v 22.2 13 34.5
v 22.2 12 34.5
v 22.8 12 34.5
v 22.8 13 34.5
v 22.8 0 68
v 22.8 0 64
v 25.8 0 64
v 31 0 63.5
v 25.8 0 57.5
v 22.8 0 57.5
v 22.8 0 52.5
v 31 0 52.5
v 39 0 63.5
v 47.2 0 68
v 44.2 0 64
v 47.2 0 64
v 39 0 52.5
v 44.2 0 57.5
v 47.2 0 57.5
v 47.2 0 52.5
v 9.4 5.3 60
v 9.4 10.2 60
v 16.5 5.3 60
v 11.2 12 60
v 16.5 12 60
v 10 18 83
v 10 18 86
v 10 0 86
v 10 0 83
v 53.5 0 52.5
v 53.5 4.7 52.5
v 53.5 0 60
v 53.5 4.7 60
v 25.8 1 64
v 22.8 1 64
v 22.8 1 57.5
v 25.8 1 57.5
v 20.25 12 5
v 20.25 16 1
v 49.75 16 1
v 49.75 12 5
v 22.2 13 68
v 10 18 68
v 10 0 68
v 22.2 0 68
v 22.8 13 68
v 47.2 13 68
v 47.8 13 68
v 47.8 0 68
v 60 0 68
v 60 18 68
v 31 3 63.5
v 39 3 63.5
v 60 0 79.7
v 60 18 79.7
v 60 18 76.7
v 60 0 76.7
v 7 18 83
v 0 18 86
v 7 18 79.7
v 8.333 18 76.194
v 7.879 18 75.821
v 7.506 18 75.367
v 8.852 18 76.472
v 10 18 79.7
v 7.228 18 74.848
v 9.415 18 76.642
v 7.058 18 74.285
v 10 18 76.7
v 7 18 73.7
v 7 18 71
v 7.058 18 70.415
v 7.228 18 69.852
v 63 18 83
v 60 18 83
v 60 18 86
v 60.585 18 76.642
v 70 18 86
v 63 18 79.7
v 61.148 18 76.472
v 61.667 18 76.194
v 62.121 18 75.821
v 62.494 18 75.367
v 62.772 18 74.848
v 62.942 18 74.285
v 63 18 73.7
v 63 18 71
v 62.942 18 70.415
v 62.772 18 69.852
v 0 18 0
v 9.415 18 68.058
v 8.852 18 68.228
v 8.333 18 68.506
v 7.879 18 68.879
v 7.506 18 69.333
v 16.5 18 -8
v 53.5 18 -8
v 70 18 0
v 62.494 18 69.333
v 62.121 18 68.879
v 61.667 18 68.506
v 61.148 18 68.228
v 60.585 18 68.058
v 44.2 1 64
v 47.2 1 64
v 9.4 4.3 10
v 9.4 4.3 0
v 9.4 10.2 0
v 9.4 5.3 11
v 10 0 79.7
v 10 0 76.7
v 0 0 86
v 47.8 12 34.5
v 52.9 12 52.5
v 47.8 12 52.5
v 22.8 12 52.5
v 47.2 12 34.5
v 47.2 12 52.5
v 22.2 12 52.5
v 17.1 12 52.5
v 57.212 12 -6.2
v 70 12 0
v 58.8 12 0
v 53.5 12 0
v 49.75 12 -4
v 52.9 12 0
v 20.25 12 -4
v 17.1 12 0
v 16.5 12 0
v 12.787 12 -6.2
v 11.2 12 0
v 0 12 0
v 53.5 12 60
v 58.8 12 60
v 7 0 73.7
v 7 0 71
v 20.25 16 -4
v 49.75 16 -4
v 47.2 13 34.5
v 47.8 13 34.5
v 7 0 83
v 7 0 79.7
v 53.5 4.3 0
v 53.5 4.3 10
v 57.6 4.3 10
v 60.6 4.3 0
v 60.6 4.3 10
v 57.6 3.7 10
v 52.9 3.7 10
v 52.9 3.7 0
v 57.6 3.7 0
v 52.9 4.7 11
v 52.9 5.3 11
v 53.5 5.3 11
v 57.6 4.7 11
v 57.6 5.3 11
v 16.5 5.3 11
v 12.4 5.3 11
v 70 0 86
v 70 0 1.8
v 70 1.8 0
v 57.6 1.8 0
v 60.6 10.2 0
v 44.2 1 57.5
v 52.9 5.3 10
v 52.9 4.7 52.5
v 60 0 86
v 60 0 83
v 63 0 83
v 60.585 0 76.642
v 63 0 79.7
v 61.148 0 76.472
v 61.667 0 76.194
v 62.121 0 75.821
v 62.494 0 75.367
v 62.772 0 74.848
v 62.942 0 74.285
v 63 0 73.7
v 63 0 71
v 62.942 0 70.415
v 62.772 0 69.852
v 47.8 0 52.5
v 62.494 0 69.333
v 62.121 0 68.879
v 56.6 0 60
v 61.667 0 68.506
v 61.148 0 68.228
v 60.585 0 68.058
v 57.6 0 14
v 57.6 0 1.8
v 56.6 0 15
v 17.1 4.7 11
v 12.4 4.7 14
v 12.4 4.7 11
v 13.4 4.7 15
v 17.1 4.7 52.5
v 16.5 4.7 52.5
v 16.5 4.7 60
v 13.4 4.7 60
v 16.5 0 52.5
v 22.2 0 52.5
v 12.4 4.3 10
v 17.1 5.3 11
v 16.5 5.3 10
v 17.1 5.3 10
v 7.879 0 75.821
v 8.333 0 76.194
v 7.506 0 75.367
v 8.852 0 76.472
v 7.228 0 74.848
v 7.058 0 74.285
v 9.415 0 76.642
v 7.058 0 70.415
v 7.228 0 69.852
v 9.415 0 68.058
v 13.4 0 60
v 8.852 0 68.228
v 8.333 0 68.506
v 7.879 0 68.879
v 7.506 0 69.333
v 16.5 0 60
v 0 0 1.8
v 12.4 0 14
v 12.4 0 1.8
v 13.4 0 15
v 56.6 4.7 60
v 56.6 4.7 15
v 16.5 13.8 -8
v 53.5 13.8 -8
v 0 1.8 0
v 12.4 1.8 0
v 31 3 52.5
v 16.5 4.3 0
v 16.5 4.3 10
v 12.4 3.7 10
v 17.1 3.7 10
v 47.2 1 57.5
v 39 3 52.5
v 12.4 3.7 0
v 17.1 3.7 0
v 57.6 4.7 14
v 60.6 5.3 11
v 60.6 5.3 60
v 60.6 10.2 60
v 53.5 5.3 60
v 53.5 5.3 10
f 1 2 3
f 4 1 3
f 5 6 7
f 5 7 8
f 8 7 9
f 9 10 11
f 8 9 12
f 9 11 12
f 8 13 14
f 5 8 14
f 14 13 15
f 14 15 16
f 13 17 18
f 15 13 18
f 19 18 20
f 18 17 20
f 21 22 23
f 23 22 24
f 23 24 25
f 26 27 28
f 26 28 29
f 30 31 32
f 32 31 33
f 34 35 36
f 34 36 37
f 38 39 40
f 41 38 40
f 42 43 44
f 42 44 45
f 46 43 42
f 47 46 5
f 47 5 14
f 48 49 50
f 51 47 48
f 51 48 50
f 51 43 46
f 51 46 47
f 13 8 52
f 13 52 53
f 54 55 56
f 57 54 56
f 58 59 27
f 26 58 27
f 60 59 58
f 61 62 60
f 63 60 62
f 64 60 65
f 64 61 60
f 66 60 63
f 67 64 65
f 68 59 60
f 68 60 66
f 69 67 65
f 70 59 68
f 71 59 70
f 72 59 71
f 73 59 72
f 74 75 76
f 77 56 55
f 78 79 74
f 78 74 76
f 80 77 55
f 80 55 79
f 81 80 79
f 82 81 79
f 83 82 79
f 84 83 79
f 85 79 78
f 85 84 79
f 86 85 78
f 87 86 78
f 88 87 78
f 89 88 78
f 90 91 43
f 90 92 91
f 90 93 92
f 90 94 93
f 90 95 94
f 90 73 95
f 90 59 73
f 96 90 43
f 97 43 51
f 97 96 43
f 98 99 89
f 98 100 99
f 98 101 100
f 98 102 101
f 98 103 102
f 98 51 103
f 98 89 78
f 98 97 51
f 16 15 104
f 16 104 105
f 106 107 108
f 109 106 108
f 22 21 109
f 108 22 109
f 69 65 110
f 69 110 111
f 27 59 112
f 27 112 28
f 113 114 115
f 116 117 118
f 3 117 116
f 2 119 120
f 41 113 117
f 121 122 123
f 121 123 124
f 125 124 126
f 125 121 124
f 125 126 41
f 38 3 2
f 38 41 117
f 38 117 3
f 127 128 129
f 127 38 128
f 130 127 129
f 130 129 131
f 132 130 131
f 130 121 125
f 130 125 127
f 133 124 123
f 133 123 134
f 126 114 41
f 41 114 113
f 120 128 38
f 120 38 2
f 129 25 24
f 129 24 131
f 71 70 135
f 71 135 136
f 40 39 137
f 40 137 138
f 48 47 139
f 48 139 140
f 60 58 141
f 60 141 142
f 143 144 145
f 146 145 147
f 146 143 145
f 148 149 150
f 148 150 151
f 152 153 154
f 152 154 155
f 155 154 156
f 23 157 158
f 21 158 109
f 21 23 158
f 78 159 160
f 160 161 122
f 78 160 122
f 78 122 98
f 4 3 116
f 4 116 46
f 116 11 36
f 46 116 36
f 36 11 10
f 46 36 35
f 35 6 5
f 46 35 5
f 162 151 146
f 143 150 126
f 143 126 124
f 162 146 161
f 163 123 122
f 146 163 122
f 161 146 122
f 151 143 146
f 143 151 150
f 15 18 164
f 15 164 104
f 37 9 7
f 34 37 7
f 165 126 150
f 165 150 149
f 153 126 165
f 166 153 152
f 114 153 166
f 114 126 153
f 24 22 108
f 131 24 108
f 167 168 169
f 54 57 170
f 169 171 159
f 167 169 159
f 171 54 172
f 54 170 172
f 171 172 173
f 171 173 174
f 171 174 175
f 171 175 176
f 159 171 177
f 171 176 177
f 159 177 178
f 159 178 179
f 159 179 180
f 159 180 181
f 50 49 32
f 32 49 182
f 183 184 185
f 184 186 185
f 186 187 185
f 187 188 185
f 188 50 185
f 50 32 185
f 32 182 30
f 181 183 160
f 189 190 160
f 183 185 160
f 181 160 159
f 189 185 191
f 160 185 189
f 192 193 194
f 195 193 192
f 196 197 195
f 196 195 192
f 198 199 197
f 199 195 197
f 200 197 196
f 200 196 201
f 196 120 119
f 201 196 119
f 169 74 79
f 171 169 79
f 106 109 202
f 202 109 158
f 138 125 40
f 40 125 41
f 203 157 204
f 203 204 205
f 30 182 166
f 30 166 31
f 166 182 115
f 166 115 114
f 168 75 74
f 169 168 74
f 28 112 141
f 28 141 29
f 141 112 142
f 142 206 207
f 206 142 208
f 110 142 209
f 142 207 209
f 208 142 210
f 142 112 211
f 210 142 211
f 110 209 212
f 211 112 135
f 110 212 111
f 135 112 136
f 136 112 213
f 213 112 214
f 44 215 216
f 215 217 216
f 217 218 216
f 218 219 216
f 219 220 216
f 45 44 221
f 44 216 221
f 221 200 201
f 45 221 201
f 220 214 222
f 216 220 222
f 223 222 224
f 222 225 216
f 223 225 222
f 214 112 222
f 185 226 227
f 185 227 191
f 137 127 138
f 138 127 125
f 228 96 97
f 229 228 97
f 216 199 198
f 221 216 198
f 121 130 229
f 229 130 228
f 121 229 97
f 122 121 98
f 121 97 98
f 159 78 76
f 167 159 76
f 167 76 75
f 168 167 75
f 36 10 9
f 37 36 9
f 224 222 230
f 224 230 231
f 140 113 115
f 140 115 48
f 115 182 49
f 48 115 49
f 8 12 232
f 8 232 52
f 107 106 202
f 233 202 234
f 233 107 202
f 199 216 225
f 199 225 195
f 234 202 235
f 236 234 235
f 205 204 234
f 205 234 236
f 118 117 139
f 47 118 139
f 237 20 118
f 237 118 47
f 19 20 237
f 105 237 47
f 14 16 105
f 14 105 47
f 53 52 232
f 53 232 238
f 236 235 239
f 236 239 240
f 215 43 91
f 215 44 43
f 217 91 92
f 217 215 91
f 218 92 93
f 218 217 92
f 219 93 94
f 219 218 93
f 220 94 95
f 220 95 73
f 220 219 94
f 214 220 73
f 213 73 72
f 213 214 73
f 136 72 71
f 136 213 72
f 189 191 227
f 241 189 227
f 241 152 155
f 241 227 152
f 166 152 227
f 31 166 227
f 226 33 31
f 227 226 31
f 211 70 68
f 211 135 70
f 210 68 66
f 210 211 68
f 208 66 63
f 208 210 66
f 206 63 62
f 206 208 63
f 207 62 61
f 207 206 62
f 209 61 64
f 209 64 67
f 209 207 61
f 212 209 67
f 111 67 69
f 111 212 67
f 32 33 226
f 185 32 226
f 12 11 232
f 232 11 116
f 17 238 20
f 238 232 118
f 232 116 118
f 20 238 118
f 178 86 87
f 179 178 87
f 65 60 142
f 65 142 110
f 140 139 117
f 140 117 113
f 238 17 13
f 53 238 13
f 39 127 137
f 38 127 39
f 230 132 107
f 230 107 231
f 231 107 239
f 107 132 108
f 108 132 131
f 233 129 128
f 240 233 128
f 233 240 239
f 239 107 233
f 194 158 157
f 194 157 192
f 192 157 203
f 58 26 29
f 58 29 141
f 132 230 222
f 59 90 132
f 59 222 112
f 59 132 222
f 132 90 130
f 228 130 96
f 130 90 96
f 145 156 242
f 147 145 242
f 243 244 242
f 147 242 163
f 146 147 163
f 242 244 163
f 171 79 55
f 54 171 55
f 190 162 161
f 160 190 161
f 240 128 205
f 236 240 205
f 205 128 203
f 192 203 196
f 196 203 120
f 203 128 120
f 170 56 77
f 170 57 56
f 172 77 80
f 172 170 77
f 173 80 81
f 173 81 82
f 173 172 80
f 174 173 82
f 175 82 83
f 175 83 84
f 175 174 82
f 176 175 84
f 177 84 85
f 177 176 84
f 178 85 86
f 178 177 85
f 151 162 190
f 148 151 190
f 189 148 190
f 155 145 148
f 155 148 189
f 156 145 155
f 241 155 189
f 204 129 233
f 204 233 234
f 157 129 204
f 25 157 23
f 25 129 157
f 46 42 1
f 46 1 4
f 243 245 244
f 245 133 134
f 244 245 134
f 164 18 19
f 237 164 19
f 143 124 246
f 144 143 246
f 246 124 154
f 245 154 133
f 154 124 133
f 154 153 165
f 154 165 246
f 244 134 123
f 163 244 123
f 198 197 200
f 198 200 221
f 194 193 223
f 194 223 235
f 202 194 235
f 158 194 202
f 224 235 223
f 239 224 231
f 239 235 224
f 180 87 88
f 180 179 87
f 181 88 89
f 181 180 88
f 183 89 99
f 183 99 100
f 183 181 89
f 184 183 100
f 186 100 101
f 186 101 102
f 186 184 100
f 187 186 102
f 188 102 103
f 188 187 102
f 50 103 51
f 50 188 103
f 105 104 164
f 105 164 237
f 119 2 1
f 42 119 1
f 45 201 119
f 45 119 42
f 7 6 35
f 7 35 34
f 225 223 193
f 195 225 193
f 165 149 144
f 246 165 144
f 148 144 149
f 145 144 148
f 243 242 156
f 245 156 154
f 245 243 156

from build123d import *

# Parameters (mm, degrees)
SKETCH_1_W           = 70
SKETCH_1_H           = 18
EXTRUDE_1_DEPTH      = 60
CUT_EXTRUDE_1_DEPTH  = 94.936148527
SKETCH_3_W           = 15
SKETCH_3_H           = 5.3
CUT_EXTRUDE_2_DEPTH  = 1
SKETCH_4_W           = 15
SKETCH_4_H           = 5.3
CUT_EXTRUDE_3_DEPTH  = 1
SKETCH_5_W           = 3
SKETCH_5_H           = 11
CUT_EXTRUDE_4_DEPTH  = 1
SKETCH_6_W           = 3
SKETCH_6_H           = 11
CUT_EXTRUDE_5_DEPTH  = 1
CHAMFER_1_SIZE       = 1
EXTRUDE_9_DEPTH      = 6
SKETCH_7_W           = 29.5
SKETCH_7_H           = 9
CUT_EXTRUDE_7_DEPTH  = 4
SKETCH_9_W           = 37
SKETCH_9_H           = 7.5
EXTRUDE_3_DEPTH      = 12
SKETCH_10_W          = 70
SKETCH_10_H          = 18
EXTRUDE_4_DEPTH      = 8
CHAMFER_4_SIZE       = 4
SKETCH_11_W          = 8
SKETCH_11_H          = 11
CUT_EXTRUDE_8_DEPTH  = 3
SKETCH_12_W          = 0.6
SKETCH_12_H          = 33.5
CUT_EXTRUDE_9_DEPTH  = 13
SKETCH_13_W          = 0.6
SKETCH_13_H          = 52.5
EXTRUDE_5_DEPTH      = 6.7
SKETCH_14_W          = 0.6
SKETCH_14_H          = 10
EXTRUDE_6_DEPTH      = 1
SKETCH_15_W          = 7.7
SKETCH_15_H          = 49
EXTRUDE_7_DEPTH      = 0.6
SKETCH_18_W          = 7.7
SKETCH_18_H          = 10
EXTRUDE_8_DEPTH      = 0.6
CHAMFER_5_SIZE       = 1.8
SKETCH_22_W          = 3
SKETCH_22_H          = 6.5
CUT_EXTRUDE_10_DEPTH = 1
EXTRUDE_10_DEPTH     = 18
FILLET_1_R           = 3


with BuildPart() as part:
    # 草图1 → 凸台-拉伸1 (new body)
    with BuildSketch(Plane.XY):
        with Locations((35, 9)):
            Rectangle(SKETCH_1_W, SKETCH_1_H)
    extrude(amount=EXTRUDE_1_DEPTH)

    # 草图2 → 切除-拉伸1 (cut, through all)
    with BuildSketch(Plane.XY.offset(60)):
        Polygon((13.4, 0), (13.4, 5.3), (9.4, 5.3), (9.4, 12), (60.6, 12), (60.6, 5.3), (56.6, 5.3), (56.6, 0), align=None)
    extrude(amount=-CUT_EXTRUDE_1_DEPTH, mode=Mode.SUBTRACT)

    # 草图3 → 切除-拉伸2 (cut)
    with BuildSketch(Plane(origin=(13.4, 0, 0), x_dir=(0, 0, -1), z_dir=(1, 0, 0))):
        with Locations((-7.5, 2.65)):
            Rectangle(SKETCH_3_W, SKETCH_3_H)
    extrude(amount=-CUT_EXTRUDE_2_DEPTH, mode=Mode.SUBTRACT)

    # 草图4 → 切除-拉伸3 (cut)
    with BuildSketch(Plane.ZY.offset(-56.6)):
        with Locations((7.5, 2.65)):
            Rectangle(SKETCH_4_W, SKETCH_4_H)
    extrude(amount=-CUT_EXTRUDE_3_DEPTH, mode=Mode.SUBTRACT)

    # 草图5 → 切除-拉伸4 (cut)
    with BuildSketch(Plane(origin=(0, 5.3, 0), x_dir=(1, 0, 0), z_dir=(0, 1, 0))):
        with Locations((59.1, -5.5)):
            Rectangle(SKETCH_5_W, SKETCH_5_H)
    extrude(amount=-CUT_EXTRUDE_4_DEPTH, mode=Mode.SUBTRACT)

    # 草图6 → 切除-拉伸5 (cut)
    with BuildSketch(Plane(origin=(0, 5.3, 0), x_dir=(1, 0, 0), z_dir=(0, 1, 0))):
        with Locations((10.9, -5.5)):
            Rectangle(SKETCH_6_W, SKETCH_6_H)
    extrude(amount=-CUT_EXTRUDE_5_DEPTH, mode=Mode.SUBTRACT)

    # 倒角1
    chamfer_1_edges = [part.edges().sort_by_distance(p)[0] for p in [
        (59.1, 4.3, 11),
        (10.9, 4.3, 11),
        (12.4, 2.65, 15),
        (57.6, 2.65, 15),
    ]]
    chamfer(chamfer_1_edges, length=CHAMFER_1_SIZE - 0.0001)  # a hair under: the kernel refuses the full size

    # 草图21 → 凸台-拉伸9 (add)
    with BuildSketch(Plane(origin=(0, 18, 0), x_dir=(1, 0, 0), z_dir=(0, 1, 0))):
        Polygon((0, 0), (16.5, 8), (53.5, 8), (70, 0), align=None)
    extrude(amount=-EXTRUDE_9_DEPTH)

    # 草图7 → 切除-拉伸7 (cut)
    with BuildSketch(Plane.XZ.offset(-12)):
        with Locations((35, 0.5)):
            Rectangle(SKETCH_7_W, SKETCH_7_H)
    extrude(amount=-CUT_EXTRUDE_7_DEPTH, mode=Mode.SUBTRACT)

    # 草图9 → 凸台-拉伸3 (add)
    with BuildSketch(Plane.XZ.offset(-12)):
        with Locations((35, 56.25)):
            Rectangle(SKETCH_9_W, SKETCH_9_H)
    extrude(amount=EXTRUDE_3_DEPTH)

    # 草图10 → 凸台-拉伸4 (add)
    with BuildSketch(Plane.XY.offset(60)):
        with Locations((35, 9)):
            Rectangle(SKETCH_10_W, SKETCH_10_H)
    extrude(amount=EXTRUDE_4_DEPTH)

    # 倒角4
    chamfer_4_edges = [part.edges().sort_by_distance(p)[0] for p in [
        (35, 16, 5),
    ]]
    chamfer(chamfer_4_edges, length=CHAMFER_4_SIZE - 0.0001)  # a hair under: the kernel refuses the full size

    # 草图11 → 切除-拉伸8 (cut)
    with BuildSketch(Plane.XZ):
        with Locations((35, 58)):
            Rectangle(SKETCH_11_W, SKETCH_11_H)
    extrude(amount=-CUT_EXTRUDE_8_DEPTH, mode=Mode.SUBTRACT)

    # 草图12 → 切除-拉伸9 (cut)
    with BuildSketch(Plane.XZ):
        with Locations((22.5, 51.25)):
            Rectangle(SKETCH_12_W, SKETCH_12_H)
        with Locations((47.5, 51.25)):
            Rectangle(SKETCH_12_W, SKETCH_12_H)
    extrude(amount=-CUT_EXTRUDE_9_DEPTH, mode=Mode.SUBTRACT)

    # 草图13 → 凸台-拉伸5 (add)
    with BuildSketch(Plane.XZ.offset(-12)):
        with Locations((16.8, 26.25)):
            Rectangle(SKETCH_13_W, SKETCH_13_H)
        with Locations((53.2, 26.25)):
            Rectangle(SKETCH_13_W, SKETCH_13_H)
    extrude(amount=EXTRUDE_5_DEPTH)

    # 草图14 → 凸台-拉伸6 (add)
    with BuildSketch(Plane.XZ.offset(-5.3)):
        with Locations((16.8, 5)):
            Rectangle(SKETCH_14_W, SKETCH_14_H)
        with Locations((53.2, 5)):
            Rectangle(SKETCH_14_W, SKETCH_14_H)
    extrude(amount=EXTRUDE_6_DEPTH)

    # 草图15 → 凸台-拉伸7 (add)
    with BuildSketch(Plane.XZ.offset(-5.3)):
        with Locations((13.25, 35.5)):
            Rectangle(SKETCH_15_W, SKETCH_15_H)
        with Locations((56.75, 35.5)):
            Rectangle(SKETCH_15_W, SKETCH_15_H)
    extrude(amount=EXTRUDE_7_DEPTH)

    # 草图18 → 凸台-拉伸8 (add)
    with BuildSketch(Plane.XZ.offset(-4.3)):
        with Locations((13.25, 5)):
            Rectangle(SKETCH_18_W, SKETCH_18_H)
        with Locations((56.75, 5)):
            Rectangle(SKETCH_18_W, SKETCH_18_H)
    extrude(amount=EXTRUDE_8_DEPTH)

    # 倒角5
    chamfer_5_edges = [part.edges().sort_by_distance(p)[0] for p in [
        (35, 12, -8),
        (9.4, 12, 30),
        (60.6, 12, 30),
        (6.2, 0, 0),
        (63.8, 0, 0),
    ]]
    chamfer(chamfer_5_edges, length=CHAMFER_5_SIZE)

    # 草图22 → 切除-拉伸10 (cut)
    with BuildSketch(Plane.XZ):
        with Locations((24.3, 60.75)):
            Rectangle(SKETCH_22_W, SKETCH_22_H)
        with Locations((45.7, 60.75)):
            Rectangle(SKETCH_22_W, SKETCH_22_H)
    extrude(amount=-CUT_EXTRUDE_10_DEPTH, mode=Mode.SUBTRACT)

    # 草图23 → 凸台-拉伸10 (add)
    with BuildSketch(Plane(origin=(0, 18, 0), x_dir=(1, 0, 0), z_dir=(0, 1, 0))):
        Polygon((0, -68), (0, -86), (10, -86), (10, -83), (7, -83), (7, -79.7), (10, -79.7), (10, -76.7), (7, -76.7), (7, -68), align=None)
        Polygon((63, -68), (70, -68), (70, -86), (60, -86), (60, -83), (63, -83), (63, -79.7), (60, -79.7), (60, -76.7), (63, -76.7), align=None)
    extrude(amount=-EXTRUDE_10_DEPTH)

    # 圆角1
    fillet_1_edges = [part.edges().sort_by_distance(p)[0] for p in [
        (7, 9, 76.7),
        (7, 9, 68),
        (63, 9, 68),
        (63, 9, 76.7),
    ]]
    fillet(fillet_1_edges, radius=FILLET_1_R - 0.0001)  # a hair under: the kernel refuses the full size


solid = part.part
